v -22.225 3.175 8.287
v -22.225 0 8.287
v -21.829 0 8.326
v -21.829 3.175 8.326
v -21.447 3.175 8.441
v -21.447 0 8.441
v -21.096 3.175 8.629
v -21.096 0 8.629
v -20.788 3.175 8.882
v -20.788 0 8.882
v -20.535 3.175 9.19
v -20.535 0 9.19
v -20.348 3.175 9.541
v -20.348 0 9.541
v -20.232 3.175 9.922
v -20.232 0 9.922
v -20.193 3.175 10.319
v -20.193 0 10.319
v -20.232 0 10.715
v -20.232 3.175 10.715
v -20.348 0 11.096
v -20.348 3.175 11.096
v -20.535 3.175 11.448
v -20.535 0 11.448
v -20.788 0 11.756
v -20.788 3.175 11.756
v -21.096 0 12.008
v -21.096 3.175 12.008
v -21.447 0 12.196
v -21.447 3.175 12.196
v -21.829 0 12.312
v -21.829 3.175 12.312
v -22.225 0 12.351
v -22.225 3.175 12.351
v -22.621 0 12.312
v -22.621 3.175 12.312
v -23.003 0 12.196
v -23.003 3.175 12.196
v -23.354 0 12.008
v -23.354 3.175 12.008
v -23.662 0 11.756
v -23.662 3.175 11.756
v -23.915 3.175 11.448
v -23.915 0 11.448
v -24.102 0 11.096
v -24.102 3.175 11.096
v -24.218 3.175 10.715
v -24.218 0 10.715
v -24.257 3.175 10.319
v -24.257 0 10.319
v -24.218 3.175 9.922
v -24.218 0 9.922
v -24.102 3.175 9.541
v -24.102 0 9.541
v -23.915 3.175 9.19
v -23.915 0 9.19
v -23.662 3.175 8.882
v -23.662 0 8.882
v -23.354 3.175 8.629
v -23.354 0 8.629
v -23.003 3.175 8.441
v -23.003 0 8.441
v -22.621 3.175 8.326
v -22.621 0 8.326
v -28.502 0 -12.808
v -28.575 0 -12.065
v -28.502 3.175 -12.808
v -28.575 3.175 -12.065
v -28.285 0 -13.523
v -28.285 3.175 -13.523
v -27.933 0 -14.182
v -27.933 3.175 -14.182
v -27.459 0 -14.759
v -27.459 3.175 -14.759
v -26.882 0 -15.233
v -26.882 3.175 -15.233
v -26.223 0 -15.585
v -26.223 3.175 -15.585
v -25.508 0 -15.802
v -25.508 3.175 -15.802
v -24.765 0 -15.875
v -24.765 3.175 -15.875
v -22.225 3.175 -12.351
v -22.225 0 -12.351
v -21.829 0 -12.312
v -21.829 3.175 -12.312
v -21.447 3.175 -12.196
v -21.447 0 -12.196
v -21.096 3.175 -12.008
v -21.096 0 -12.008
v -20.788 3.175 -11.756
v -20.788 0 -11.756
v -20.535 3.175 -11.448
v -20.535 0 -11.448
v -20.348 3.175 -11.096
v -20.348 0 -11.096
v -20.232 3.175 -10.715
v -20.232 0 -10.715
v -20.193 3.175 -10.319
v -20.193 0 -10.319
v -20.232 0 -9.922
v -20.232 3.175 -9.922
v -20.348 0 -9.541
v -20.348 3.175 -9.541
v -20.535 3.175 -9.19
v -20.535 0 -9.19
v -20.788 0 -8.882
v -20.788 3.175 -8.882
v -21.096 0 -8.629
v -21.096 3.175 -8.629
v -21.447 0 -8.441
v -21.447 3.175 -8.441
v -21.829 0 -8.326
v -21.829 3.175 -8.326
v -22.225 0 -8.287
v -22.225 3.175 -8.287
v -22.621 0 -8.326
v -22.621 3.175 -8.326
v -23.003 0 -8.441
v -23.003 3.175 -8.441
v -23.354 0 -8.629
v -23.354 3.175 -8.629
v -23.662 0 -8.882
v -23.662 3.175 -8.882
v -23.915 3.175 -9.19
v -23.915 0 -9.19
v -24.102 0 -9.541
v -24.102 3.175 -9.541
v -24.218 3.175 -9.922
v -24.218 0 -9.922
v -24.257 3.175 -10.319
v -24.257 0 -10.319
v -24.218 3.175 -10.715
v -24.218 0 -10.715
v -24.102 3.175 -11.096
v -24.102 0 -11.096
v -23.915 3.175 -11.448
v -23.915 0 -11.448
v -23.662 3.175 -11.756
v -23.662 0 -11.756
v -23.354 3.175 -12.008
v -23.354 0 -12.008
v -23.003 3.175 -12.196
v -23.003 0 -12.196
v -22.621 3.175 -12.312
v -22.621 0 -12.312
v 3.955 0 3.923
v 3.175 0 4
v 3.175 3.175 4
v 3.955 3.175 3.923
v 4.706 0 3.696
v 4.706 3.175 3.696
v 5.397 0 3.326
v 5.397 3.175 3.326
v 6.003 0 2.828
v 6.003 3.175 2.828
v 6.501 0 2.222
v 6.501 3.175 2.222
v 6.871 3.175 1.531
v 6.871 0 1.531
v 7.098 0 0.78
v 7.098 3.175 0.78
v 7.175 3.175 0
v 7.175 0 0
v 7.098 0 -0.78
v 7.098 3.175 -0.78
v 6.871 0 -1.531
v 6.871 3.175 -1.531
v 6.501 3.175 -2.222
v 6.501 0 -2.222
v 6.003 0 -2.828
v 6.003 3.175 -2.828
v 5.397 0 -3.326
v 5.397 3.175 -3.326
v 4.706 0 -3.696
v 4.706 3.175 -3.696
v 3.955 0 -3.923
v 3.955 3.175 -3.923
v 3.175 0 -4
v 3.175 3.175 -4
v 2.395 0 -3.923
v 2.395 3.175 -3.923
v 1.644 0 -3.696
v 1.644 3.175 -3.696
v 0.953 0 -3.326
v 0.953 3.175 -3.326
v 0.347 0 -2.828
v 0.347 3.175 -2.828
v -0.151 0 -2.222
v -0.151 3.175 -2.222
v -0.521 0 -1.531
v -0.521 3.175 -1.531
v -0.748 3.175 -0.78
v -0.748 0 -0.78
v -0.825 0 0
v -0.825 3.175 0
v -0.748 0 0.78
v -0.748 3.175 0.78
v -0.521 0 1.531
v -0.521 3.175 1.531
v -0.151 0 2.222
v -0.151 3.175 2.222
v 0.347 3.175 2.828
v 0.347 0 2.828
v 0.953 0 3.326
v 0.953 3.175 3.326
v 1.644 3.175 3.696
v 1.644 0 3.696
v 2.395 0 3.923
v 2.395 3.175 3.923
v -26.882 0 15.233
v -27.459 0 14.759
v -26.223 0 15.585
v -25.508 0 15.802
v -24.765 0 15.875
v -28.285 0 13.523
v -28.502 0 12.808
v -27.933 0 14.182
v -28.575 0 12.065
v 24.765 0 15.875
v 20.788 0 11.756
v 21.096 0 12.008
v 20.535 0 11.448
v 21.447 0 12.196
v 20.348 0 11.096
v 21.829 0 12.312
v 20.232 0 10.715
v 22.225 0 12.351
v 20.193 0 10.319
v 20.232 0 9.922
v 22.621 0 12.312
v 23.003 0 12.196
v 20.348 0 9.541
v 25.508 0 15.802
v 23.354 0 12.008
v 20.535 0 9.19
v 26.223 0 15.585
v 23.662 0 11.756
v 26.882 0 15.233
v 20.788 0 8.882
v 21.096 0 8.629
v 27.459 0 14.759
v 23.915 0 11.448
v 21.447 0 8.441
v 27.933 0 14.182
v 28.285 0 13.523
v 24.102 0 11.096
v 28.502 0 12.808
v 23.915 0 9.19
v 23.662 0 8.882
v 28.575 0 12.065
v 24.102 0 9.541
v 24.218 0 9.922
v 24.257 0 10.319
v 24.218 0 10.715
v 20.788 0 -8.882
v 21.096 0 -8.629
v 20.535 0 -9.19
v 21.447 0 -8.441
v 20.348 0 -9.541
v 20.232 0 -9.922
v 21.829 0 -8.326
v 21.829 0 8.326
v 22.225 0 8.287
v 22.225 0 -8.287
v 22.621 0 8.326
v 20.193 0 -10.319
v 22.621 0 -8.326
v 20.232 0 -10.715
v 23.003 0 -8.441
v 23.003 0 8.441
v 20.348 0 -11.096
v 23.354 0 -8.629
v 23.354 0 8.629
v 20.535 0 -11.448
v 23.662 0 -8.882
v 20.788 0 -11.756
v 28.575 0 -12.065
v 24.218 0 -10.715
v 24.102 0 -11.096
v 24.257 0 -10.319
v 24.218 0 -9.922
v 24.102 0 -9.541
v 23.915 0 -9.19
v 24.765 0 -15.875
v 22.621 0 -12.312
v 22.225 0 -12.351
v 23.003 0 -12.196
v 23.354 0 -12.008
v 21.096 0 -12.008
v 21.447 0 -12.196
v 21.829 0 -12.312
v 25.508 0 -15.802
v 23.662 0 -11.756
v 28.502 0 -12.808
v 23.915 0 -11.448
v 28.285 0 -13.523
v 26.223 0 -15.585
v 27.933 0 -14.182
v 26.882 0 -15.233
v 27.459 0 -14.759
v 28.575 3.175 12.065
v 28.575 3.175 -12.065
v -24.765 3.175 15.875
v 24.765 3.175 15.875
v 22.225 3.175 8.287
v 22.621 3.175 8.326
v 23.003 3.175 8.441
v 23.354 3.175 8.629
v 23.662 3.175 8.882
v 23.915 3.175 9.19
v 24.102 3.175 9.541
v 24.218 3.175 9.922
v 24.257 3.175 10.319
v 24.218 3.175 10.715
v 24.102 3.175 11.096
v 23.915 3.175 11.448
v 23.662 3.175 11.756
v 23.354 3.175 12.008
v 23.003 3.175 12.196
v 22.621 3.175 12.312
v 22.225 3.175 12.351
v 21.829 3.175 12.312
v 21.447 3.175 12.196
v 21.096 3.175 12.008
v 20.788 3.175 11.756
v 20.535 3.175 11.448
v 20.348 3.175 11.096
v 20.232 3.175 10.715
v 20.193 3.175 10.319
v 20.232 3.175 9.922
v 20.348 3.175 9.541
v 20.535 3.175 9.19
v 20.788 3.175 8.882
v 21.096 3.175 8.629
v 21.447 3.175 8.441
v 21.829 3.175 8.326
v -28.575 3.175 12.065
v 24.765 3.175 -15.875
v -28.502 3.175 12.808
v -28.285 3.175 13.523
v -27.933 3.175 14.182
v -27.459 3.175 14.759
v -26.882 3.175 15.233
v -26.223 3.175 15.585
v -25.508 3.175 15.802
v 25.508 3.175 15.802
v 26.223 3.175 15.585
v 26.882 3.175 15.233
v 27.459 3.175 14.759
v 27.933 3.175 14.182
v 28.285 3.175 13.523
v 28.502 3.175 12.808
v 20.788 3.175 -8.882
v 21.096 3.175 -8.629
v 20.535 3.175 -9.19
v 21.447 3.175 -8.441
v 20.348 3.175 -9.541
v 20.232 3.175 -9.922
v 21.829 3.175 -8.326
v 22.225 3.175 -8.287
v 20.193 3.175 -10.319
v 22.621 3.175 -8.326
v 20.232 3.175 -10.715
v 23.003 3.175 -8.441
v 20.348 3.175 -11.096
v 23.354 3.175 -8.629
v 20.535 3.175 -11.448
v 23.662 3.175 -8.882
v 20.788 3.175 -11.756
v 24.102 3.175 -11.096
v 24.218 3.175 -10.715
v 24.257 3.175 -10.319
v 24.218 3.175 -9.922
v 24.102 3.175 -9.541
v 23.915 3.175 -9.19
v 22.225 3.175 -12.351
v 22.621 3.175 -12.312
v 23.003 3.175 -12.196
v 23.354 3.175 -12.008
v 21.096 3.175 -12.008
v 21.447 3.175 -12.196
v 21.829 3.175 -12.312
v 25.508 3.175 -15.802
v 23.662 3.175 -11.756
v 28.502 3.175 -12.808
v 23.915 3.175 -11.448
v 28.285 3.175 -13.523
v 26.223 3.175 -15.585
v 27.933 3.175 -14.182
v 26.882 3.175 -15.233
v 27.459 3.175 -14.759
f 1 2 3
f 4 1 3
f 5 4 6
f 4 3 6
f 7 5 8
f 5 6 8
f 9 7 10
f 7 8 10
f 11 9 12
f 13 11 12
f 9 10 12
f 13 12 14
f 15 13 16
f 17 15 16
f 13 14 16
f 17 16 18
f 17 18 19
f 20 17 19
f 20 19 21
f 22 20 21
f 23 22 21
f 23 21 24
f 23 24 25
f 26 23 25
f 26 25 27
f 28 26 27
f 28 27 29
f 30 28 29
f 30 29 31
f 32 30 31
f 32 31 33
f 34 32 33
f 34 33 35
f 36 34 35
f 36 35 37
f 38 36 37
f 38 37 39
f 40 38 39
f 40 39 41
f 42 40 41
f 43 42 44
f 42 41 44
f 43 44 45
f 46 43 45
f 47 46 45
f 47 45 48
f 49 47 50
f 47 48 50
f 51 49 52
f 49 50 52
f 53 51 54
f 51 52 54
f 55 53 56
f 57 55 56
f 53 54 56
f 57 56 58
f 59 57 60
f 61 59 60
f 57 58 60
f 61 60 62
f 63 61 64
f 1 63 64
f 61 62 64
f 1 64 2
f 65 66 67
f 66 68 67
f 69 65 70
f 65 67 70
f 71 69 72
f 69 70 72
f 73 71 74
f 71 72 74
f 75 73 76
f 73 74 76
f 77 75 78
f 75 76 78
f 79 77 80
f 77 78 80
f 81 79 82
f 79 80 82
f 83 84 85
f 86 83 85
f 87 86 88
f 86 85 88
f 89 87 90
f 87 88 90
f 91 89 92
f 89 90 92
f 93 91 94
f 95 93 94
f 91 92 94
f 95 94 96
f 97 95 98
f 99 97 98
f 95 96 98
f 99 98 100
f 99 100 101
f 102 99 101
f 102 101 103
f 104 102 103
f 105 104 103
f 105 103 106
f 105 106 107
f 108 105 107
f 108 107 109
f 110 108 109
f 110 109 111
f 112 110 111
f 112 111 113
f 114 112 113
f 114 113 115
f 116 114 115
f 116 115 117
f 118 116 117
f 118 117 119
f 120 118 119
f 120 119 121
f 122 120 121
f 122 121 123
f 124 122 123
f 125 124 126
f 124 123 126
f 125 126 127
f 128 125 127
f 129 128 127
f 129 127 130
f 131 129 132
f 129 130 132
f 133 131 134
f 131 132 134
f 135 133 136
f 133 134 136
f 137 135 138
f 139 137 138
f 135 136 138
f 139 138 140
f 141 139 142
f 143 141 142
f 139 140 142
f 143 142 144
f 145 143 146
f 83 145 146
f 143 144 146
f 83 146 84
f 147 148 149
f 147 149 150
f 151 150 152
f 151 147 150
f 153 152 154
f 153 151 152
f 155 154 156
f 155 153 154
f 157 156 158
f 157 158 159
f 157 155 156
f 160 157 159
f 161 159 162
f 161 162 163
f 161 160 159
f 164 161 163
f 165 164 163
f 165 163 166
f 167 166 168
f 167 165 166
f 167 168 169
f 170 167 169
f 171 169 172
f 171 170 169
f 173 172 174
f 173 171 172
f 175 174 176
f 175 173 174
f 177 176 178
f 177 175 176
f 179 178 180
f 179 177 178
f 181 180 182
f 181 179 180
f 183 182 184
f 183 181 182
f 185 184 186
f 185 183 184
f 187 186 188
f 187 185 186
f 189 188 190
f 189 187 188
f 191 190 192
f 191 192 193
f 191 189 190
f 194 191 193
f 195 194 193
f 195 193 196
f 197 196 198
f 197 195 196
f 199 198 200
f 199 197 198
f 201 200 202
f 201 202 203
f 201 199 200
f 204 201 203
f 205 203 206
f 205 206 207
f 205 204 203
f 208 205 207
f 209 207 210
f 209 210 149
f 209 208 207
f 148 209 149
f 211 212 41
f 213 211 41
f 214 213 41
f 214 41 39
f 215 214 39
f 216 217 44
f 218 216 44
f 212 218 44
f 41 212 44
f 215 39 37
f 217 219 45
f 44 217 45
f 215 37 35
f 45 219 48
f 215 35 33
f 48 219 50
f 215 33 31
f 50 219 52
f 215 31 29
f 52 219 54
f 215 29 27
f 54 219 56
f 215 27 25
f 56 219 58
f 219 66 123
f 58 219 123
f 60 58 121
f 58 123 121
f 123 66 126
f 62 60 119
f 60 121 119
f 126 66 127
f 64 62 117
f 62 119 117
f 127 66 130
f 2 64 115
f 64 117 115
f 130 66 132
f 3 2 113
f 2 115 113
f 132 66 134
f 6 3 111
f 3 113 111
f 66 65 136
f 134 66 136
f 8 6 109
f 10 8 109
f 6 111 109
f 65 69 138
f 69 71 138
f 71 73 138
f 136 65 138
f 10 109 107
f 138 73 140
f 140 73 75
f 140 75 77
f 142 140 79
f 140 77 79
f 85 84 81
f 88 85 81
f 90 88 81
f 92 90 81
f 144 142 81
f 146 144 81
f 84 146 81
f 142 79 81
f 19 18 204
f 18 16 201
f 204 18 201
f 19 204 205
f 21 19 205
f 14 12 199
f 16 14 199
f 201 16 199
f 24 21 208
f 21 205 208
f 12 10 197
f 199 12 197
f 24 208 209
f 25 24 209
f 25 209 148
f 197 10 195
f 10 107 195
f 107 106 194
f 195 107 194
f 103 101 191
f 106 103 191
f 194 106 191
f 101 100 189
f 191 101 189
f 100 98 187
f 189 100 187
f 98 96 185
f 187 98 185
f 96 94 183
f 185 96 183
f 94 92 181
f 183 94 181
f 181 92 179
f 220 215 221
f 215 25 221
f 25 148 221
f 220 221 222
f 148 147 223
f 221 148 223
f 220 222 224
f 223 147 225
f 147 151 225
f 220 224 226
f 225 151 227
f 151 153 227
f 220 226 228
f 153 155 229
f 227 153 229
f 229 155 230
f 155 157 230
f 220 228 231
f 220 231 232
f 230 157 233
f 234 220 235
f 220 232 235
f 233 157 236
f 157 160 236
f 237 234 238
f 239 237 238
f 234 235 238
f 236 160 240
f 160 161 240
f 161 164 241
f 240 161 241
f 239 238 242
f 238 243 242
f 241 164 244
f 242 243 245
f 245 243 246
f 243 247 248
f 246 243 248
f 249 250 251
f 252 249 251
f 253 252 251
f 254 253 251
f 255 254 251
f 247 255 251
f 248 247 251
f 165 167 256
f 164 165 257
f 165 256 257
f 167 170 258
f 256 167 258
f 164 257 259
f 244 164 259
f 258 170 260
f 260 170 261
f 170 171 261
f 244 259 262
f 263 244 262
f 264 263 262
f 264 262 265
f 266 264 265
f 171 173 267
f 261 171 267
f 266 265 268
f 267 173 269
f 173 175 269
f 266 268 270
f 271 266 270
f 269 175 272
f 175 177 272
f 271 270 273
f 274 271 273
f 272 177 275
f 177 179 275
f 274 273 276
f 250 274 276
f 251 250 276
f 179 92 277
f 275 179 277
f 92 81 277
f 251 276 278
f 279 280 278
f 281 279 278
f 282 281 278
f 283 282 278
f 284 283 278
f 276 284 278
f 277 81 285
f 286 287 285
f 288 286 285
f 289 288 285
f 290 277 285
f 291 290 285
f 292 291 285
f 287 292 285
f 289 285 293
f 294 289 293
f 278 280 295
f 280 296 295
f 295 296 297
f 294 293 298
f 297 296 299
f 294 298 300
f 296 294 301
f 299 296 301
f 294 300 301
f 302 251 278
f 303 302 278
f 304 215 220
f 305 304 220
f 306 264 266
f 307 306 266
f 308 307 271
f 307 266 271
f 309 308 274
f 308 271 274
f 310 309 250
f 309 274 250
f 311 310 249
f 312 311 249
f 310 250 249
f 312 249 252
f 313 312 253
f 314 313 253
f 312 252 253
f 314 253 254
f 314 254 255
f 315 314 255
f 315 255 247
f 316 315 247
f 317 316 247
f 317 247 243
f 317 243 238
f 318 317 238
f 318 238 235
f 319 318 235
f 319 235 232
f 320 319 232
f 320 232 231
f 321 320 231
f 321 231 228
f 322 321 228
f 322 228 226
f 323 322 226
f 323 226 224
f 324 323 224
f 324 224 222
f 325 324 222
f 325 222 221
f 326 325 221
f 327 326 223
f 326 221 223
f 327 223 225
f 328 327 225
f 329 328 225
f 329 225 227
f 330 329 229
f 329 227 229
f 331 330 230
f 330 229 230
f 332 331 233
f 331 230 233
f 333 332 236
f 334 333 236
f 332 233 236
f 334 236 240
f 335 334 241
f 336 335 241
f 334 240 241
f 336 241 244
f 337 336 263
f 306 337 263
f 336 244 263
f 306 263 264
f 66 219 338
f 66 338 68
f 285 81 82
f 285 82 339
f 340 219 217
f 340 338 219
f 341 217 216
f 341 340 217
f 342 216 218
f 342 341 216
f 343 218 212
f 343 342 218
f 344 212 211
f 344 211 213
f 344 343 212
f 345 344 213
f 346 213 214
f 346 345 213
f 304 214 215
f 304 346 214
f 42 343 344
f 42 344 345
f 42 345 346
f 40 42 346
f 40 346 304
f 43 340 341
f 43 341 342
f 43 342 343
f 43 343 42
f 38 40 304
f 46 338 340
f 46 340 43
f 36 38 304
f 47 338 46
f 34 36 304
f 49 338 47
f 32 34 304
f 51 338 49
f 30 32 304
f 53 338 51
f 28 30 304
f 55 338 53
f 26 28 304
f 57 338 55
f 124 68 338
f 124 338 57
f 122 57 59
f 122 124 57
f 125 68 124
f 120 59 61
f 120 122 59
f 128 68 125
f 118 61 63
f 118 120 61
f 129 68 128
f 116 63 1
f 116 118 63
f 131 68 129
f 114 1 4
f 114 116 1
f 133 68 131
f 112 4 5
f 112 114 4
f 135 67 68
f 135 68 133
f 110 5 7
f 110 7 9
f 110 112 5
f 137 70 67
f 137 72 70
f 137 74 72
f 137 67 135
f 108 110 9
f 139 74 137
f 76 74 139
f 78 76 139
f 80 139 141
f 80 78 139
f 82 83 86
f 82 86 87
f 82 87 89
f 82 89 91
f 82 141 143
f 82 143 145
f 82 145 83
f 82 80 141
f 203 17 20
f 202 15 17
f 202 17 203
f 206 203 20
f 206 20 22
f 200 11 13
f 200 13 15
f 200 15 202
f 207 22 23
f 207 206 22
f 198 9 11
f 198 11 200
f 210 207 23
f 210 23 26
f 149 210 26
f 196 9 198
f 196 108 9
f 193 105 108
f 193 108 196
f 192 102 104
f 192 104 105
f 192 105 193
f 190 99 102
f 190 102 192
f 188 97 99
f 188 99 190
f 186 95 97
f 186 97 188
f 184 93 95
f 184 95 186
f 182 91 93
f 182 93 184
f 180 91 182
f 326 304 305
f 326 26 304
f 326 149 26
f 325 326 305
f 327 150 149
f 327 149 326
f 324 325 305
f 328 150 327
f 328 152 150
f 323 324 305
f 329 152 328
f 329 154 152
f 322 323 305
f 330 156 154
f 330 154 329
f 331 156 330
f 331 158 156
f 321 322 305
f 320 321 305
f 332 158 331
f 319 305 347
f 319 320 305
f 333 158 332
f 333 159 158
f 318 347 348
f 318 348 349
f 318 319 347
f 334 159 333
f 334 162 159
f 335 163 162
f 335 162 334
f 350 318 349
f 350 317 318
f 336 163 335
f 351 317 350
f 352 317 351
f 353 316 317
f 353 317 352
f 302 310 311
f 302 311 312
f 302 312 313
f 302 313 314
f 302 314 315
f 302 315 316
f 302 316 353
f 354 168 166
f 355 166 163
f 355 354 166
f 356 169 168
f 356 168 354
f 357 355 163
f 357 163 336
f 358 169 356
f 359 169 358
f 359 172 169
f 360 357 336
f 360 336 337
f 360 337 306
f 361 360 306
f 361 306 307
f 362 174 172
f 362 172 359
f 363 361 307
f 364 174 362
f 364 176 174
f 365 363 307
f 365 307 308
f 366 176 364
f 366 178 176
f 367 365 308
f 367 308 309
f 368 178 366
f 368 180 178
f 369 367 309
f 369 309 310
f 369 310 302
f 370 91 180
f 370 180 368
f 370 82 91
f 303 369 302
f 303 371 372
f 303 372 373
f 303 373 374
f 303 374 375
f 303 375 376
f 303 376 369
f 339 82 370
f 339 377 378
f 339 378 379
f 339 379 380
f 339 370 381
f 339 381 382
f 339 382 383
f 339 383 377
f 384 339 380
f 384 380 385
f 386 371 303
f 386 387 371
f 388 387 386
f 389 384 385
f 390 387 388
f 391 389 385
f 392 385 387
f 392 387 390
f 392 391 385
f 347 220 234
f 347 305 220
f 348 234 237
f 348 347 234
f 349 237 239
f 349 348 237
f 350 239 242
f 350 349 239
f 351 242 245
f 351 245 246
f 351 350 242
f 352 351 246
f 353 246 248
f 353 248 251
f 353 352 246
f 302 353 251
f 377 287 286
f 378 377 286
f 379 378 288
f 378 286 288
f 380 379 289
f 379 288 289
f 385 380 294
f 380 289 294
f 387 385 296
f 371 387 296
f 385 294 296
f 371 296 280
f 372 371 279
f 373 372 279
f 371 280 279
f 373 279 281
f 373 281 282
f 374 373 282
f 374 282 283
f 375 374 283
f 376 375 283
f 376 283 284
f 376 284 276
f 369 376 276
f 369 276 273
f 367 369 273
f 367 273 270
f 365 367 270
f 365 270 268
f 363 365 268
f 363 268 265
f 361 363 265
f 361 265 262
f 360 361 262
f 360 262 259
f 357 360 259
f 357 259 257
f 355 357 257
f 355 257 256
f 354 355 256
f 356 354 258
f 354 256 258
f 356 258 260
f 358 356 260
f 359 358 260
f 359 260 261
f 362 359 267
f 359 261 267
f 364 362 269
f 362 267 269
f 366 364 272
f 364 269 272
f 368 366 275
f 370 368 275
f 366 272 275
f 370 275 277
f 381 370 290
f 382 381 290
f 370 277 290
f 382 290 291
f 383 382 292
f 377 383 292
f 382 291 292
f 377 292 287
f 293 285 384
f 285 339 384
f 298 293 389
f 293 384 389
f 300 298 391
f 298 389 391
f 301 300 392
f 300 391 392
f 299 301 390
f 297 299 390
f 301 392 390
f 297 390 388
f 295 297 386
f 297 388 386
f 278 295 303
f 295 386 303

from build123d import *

# Parameters (mm, degrees)
SKETCH1_W           = 57.15
SKETCH1_H           = 31.75
SKETCH1_R           = 4
BOSS_EXTRUDE1_DEPTH = 3.175
FILLET1_R           = 3.81
SKETCH2_R           = 2.032
CUT_EXTRUDE1_DEPTH  = 33.842455374


with BuildPart() as part:
    # Sketch1 → Boss-Extrude1 (new body)
    with BuildSketch(Plane(origin=(0, 0, 0), x_dir=(1, 0, 0), z_dir=(0, 1, 0))):
        Rectangle(SKETCH1_W, SKETCH1_H)
        with Locations(Location((3.175, 0, 0), (0, 0, 270))):
            Circle(SKETCH1_R, mode=Mode.SUBTRACT)
    extrude(amount=BOSS_EXTRUDE1_DEPTH)

    # Fillet1
    fillet1_edges = [part.edges().sort_by_distance(p)[0] for p in [
        (28.575, 1.5875, 15.875),
        (-28.575, 1.5875, 15.875),
        (-28.575, 1.5875, -15.875),
        (28.575, 1.5875, -15.875),
    ]]
    fillet(fillet1_edges, radius=FILLET1_R)

    # Sketch2 → Cut-Extrude1 (cut, through all)
    with BuildSketch(Plane.XZ):
        with Locations(Location((22.225, -10.31875, 0), (0, 0, 270))):
            Circle(SKETCH2_R)
        with Locations(Location((22.225, 10.31875, 0), (0, 0, 270))):
            Circle(SKETCH2_R)
        with Locations(Location((-22.225, -10.31875, 0), (0, 0, 270))):
            Circle(SKETCH2_R)
        with Locations(Location((-22.225, 10.31875, 0), (0, 0, 270))):
            Circle(SKETCH2_R)
    extrude(amount=-CUT_EXTRUDE1_DEPTH, mode=Mode.SUBTRACT)


solid = part.part
